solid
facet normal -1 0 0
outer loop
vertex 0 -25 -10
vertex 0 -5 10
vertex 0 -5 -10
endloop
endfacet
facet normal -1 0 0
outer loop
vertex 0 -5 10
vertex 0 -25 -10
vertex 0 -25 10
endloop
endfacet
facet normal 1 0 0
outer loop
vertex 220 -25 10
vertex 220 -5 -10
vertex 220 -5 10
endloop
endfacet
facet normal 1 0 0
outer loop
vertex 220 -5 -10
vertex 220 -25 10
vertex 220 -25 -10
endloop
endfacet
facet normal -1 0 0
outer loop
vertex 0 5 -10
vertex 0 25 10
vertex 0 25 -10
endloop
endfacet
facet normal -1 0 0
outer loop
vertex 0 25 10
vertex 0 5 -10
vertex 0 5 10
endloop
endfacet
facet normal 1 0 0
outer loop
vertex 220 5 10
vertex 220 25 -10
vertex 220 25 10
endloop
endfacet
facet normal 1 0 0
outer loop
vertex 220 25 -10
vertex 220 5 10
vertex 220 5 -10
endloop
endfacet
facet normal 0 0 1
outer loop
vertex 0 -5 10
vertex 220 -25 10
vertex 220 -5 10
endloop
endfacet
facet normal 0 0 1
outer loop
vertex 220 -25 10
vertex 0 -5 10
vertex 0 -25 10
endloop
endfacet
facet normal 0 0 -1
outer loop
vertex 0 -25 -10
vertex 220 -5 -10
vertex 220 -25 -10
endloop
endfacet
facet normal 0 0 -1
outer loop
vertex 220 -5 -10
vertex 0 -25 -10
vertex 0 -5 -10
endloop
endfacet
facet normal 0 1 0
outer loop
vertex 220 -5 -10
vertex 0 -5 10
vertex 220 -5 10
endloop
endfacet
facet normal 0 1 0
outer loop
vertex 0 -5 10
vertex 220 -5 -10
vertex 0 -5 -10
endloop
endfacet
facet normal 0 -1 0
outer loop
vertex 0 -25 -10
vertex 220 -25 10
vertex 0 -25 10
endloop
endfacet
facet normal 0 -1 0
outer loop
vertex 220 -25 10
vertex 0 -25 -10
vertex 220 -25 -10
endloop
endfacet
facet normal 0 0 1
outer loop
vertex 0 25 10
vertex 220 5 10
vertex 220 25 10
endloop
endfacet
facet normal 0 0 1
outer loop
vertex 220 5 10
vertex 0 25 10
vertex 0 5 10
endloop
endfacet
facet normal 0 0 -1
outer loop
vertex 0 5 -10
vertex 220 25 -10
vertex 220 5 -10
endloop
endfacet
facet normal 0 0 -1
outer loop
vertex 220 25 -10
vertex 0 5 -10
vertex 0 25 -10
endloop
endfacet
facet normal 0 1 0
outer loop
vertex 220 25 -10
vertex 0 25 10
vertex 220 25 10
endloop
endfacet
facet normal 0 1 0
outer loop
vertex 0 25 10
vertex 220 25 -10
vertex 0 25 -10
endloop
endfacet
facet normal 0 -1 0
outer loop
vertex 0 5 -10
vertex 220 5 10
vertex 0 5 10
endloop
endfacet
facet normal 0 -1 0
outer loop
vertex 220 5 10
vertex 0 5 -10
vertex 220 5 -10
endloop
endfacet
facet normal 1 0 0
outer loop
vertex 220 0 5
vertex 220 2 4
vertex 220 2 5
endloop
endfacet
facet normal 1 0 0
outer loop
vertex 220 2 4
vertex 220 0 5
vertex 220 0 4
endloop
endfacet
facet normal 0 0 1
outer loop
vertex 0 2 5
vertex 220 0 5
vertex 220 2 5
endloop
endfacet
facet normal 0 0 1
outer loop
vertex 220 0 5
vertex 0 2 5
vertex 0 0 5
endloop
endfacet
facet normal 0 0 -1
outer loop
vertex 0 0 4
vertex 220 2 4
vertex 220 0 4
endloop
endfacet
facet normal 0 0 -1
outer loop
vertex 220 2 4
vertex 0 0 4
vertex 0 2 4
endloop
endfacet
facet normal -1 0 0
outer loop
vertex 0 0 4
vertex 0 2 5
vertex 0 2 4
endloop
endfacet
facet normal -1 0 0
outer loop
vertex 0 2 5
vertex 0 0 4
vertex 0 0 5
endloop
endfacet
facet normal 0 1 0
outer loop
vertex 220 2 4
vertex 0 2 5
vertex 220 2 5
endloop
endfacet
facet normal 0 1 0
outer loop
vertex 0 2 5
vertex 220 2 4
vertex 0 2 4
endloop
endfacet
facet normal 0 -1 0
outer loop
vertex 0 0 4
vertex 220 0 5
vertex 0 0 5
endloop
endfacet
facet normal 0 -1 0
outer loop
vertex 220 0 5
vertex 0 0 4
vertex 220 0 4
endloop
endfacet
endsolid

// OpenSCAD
module assembly_preview() {
  rod_d = 8.0;
  rod_spacing = 40.0;
  rod_len = 220.0;
  
  module rods(){
    color([0.7,0.7,0.7]) {
      translate([0, -rod_spacing/2, 0]) rotate([0,90,0]) cylinder(h=rod_len, d=rod_d, center=false);
      translate([0,  rod_spacing/2, 0]) rotate([0,90,0]) cylinder(h=rod_len, d=rod_d, center=false);
    }
  }
  rods();
  color([0.3,0.3,0.3]) translate([0, -25, -10]) cube([rod_len, 20, 20], center=false);
  color([0.3,0.3,0.3]) translate([0,  5, -10]) cube([rod_len, 20, 20], center=false);
  color([0.1,0.1,0.1]) translate([0,0,rod_d/2]) cube([rod_len, 2, 1], center=false);
  // Import and position printable parts manually if you want a full assembly preview.
}
assembly_preview();
